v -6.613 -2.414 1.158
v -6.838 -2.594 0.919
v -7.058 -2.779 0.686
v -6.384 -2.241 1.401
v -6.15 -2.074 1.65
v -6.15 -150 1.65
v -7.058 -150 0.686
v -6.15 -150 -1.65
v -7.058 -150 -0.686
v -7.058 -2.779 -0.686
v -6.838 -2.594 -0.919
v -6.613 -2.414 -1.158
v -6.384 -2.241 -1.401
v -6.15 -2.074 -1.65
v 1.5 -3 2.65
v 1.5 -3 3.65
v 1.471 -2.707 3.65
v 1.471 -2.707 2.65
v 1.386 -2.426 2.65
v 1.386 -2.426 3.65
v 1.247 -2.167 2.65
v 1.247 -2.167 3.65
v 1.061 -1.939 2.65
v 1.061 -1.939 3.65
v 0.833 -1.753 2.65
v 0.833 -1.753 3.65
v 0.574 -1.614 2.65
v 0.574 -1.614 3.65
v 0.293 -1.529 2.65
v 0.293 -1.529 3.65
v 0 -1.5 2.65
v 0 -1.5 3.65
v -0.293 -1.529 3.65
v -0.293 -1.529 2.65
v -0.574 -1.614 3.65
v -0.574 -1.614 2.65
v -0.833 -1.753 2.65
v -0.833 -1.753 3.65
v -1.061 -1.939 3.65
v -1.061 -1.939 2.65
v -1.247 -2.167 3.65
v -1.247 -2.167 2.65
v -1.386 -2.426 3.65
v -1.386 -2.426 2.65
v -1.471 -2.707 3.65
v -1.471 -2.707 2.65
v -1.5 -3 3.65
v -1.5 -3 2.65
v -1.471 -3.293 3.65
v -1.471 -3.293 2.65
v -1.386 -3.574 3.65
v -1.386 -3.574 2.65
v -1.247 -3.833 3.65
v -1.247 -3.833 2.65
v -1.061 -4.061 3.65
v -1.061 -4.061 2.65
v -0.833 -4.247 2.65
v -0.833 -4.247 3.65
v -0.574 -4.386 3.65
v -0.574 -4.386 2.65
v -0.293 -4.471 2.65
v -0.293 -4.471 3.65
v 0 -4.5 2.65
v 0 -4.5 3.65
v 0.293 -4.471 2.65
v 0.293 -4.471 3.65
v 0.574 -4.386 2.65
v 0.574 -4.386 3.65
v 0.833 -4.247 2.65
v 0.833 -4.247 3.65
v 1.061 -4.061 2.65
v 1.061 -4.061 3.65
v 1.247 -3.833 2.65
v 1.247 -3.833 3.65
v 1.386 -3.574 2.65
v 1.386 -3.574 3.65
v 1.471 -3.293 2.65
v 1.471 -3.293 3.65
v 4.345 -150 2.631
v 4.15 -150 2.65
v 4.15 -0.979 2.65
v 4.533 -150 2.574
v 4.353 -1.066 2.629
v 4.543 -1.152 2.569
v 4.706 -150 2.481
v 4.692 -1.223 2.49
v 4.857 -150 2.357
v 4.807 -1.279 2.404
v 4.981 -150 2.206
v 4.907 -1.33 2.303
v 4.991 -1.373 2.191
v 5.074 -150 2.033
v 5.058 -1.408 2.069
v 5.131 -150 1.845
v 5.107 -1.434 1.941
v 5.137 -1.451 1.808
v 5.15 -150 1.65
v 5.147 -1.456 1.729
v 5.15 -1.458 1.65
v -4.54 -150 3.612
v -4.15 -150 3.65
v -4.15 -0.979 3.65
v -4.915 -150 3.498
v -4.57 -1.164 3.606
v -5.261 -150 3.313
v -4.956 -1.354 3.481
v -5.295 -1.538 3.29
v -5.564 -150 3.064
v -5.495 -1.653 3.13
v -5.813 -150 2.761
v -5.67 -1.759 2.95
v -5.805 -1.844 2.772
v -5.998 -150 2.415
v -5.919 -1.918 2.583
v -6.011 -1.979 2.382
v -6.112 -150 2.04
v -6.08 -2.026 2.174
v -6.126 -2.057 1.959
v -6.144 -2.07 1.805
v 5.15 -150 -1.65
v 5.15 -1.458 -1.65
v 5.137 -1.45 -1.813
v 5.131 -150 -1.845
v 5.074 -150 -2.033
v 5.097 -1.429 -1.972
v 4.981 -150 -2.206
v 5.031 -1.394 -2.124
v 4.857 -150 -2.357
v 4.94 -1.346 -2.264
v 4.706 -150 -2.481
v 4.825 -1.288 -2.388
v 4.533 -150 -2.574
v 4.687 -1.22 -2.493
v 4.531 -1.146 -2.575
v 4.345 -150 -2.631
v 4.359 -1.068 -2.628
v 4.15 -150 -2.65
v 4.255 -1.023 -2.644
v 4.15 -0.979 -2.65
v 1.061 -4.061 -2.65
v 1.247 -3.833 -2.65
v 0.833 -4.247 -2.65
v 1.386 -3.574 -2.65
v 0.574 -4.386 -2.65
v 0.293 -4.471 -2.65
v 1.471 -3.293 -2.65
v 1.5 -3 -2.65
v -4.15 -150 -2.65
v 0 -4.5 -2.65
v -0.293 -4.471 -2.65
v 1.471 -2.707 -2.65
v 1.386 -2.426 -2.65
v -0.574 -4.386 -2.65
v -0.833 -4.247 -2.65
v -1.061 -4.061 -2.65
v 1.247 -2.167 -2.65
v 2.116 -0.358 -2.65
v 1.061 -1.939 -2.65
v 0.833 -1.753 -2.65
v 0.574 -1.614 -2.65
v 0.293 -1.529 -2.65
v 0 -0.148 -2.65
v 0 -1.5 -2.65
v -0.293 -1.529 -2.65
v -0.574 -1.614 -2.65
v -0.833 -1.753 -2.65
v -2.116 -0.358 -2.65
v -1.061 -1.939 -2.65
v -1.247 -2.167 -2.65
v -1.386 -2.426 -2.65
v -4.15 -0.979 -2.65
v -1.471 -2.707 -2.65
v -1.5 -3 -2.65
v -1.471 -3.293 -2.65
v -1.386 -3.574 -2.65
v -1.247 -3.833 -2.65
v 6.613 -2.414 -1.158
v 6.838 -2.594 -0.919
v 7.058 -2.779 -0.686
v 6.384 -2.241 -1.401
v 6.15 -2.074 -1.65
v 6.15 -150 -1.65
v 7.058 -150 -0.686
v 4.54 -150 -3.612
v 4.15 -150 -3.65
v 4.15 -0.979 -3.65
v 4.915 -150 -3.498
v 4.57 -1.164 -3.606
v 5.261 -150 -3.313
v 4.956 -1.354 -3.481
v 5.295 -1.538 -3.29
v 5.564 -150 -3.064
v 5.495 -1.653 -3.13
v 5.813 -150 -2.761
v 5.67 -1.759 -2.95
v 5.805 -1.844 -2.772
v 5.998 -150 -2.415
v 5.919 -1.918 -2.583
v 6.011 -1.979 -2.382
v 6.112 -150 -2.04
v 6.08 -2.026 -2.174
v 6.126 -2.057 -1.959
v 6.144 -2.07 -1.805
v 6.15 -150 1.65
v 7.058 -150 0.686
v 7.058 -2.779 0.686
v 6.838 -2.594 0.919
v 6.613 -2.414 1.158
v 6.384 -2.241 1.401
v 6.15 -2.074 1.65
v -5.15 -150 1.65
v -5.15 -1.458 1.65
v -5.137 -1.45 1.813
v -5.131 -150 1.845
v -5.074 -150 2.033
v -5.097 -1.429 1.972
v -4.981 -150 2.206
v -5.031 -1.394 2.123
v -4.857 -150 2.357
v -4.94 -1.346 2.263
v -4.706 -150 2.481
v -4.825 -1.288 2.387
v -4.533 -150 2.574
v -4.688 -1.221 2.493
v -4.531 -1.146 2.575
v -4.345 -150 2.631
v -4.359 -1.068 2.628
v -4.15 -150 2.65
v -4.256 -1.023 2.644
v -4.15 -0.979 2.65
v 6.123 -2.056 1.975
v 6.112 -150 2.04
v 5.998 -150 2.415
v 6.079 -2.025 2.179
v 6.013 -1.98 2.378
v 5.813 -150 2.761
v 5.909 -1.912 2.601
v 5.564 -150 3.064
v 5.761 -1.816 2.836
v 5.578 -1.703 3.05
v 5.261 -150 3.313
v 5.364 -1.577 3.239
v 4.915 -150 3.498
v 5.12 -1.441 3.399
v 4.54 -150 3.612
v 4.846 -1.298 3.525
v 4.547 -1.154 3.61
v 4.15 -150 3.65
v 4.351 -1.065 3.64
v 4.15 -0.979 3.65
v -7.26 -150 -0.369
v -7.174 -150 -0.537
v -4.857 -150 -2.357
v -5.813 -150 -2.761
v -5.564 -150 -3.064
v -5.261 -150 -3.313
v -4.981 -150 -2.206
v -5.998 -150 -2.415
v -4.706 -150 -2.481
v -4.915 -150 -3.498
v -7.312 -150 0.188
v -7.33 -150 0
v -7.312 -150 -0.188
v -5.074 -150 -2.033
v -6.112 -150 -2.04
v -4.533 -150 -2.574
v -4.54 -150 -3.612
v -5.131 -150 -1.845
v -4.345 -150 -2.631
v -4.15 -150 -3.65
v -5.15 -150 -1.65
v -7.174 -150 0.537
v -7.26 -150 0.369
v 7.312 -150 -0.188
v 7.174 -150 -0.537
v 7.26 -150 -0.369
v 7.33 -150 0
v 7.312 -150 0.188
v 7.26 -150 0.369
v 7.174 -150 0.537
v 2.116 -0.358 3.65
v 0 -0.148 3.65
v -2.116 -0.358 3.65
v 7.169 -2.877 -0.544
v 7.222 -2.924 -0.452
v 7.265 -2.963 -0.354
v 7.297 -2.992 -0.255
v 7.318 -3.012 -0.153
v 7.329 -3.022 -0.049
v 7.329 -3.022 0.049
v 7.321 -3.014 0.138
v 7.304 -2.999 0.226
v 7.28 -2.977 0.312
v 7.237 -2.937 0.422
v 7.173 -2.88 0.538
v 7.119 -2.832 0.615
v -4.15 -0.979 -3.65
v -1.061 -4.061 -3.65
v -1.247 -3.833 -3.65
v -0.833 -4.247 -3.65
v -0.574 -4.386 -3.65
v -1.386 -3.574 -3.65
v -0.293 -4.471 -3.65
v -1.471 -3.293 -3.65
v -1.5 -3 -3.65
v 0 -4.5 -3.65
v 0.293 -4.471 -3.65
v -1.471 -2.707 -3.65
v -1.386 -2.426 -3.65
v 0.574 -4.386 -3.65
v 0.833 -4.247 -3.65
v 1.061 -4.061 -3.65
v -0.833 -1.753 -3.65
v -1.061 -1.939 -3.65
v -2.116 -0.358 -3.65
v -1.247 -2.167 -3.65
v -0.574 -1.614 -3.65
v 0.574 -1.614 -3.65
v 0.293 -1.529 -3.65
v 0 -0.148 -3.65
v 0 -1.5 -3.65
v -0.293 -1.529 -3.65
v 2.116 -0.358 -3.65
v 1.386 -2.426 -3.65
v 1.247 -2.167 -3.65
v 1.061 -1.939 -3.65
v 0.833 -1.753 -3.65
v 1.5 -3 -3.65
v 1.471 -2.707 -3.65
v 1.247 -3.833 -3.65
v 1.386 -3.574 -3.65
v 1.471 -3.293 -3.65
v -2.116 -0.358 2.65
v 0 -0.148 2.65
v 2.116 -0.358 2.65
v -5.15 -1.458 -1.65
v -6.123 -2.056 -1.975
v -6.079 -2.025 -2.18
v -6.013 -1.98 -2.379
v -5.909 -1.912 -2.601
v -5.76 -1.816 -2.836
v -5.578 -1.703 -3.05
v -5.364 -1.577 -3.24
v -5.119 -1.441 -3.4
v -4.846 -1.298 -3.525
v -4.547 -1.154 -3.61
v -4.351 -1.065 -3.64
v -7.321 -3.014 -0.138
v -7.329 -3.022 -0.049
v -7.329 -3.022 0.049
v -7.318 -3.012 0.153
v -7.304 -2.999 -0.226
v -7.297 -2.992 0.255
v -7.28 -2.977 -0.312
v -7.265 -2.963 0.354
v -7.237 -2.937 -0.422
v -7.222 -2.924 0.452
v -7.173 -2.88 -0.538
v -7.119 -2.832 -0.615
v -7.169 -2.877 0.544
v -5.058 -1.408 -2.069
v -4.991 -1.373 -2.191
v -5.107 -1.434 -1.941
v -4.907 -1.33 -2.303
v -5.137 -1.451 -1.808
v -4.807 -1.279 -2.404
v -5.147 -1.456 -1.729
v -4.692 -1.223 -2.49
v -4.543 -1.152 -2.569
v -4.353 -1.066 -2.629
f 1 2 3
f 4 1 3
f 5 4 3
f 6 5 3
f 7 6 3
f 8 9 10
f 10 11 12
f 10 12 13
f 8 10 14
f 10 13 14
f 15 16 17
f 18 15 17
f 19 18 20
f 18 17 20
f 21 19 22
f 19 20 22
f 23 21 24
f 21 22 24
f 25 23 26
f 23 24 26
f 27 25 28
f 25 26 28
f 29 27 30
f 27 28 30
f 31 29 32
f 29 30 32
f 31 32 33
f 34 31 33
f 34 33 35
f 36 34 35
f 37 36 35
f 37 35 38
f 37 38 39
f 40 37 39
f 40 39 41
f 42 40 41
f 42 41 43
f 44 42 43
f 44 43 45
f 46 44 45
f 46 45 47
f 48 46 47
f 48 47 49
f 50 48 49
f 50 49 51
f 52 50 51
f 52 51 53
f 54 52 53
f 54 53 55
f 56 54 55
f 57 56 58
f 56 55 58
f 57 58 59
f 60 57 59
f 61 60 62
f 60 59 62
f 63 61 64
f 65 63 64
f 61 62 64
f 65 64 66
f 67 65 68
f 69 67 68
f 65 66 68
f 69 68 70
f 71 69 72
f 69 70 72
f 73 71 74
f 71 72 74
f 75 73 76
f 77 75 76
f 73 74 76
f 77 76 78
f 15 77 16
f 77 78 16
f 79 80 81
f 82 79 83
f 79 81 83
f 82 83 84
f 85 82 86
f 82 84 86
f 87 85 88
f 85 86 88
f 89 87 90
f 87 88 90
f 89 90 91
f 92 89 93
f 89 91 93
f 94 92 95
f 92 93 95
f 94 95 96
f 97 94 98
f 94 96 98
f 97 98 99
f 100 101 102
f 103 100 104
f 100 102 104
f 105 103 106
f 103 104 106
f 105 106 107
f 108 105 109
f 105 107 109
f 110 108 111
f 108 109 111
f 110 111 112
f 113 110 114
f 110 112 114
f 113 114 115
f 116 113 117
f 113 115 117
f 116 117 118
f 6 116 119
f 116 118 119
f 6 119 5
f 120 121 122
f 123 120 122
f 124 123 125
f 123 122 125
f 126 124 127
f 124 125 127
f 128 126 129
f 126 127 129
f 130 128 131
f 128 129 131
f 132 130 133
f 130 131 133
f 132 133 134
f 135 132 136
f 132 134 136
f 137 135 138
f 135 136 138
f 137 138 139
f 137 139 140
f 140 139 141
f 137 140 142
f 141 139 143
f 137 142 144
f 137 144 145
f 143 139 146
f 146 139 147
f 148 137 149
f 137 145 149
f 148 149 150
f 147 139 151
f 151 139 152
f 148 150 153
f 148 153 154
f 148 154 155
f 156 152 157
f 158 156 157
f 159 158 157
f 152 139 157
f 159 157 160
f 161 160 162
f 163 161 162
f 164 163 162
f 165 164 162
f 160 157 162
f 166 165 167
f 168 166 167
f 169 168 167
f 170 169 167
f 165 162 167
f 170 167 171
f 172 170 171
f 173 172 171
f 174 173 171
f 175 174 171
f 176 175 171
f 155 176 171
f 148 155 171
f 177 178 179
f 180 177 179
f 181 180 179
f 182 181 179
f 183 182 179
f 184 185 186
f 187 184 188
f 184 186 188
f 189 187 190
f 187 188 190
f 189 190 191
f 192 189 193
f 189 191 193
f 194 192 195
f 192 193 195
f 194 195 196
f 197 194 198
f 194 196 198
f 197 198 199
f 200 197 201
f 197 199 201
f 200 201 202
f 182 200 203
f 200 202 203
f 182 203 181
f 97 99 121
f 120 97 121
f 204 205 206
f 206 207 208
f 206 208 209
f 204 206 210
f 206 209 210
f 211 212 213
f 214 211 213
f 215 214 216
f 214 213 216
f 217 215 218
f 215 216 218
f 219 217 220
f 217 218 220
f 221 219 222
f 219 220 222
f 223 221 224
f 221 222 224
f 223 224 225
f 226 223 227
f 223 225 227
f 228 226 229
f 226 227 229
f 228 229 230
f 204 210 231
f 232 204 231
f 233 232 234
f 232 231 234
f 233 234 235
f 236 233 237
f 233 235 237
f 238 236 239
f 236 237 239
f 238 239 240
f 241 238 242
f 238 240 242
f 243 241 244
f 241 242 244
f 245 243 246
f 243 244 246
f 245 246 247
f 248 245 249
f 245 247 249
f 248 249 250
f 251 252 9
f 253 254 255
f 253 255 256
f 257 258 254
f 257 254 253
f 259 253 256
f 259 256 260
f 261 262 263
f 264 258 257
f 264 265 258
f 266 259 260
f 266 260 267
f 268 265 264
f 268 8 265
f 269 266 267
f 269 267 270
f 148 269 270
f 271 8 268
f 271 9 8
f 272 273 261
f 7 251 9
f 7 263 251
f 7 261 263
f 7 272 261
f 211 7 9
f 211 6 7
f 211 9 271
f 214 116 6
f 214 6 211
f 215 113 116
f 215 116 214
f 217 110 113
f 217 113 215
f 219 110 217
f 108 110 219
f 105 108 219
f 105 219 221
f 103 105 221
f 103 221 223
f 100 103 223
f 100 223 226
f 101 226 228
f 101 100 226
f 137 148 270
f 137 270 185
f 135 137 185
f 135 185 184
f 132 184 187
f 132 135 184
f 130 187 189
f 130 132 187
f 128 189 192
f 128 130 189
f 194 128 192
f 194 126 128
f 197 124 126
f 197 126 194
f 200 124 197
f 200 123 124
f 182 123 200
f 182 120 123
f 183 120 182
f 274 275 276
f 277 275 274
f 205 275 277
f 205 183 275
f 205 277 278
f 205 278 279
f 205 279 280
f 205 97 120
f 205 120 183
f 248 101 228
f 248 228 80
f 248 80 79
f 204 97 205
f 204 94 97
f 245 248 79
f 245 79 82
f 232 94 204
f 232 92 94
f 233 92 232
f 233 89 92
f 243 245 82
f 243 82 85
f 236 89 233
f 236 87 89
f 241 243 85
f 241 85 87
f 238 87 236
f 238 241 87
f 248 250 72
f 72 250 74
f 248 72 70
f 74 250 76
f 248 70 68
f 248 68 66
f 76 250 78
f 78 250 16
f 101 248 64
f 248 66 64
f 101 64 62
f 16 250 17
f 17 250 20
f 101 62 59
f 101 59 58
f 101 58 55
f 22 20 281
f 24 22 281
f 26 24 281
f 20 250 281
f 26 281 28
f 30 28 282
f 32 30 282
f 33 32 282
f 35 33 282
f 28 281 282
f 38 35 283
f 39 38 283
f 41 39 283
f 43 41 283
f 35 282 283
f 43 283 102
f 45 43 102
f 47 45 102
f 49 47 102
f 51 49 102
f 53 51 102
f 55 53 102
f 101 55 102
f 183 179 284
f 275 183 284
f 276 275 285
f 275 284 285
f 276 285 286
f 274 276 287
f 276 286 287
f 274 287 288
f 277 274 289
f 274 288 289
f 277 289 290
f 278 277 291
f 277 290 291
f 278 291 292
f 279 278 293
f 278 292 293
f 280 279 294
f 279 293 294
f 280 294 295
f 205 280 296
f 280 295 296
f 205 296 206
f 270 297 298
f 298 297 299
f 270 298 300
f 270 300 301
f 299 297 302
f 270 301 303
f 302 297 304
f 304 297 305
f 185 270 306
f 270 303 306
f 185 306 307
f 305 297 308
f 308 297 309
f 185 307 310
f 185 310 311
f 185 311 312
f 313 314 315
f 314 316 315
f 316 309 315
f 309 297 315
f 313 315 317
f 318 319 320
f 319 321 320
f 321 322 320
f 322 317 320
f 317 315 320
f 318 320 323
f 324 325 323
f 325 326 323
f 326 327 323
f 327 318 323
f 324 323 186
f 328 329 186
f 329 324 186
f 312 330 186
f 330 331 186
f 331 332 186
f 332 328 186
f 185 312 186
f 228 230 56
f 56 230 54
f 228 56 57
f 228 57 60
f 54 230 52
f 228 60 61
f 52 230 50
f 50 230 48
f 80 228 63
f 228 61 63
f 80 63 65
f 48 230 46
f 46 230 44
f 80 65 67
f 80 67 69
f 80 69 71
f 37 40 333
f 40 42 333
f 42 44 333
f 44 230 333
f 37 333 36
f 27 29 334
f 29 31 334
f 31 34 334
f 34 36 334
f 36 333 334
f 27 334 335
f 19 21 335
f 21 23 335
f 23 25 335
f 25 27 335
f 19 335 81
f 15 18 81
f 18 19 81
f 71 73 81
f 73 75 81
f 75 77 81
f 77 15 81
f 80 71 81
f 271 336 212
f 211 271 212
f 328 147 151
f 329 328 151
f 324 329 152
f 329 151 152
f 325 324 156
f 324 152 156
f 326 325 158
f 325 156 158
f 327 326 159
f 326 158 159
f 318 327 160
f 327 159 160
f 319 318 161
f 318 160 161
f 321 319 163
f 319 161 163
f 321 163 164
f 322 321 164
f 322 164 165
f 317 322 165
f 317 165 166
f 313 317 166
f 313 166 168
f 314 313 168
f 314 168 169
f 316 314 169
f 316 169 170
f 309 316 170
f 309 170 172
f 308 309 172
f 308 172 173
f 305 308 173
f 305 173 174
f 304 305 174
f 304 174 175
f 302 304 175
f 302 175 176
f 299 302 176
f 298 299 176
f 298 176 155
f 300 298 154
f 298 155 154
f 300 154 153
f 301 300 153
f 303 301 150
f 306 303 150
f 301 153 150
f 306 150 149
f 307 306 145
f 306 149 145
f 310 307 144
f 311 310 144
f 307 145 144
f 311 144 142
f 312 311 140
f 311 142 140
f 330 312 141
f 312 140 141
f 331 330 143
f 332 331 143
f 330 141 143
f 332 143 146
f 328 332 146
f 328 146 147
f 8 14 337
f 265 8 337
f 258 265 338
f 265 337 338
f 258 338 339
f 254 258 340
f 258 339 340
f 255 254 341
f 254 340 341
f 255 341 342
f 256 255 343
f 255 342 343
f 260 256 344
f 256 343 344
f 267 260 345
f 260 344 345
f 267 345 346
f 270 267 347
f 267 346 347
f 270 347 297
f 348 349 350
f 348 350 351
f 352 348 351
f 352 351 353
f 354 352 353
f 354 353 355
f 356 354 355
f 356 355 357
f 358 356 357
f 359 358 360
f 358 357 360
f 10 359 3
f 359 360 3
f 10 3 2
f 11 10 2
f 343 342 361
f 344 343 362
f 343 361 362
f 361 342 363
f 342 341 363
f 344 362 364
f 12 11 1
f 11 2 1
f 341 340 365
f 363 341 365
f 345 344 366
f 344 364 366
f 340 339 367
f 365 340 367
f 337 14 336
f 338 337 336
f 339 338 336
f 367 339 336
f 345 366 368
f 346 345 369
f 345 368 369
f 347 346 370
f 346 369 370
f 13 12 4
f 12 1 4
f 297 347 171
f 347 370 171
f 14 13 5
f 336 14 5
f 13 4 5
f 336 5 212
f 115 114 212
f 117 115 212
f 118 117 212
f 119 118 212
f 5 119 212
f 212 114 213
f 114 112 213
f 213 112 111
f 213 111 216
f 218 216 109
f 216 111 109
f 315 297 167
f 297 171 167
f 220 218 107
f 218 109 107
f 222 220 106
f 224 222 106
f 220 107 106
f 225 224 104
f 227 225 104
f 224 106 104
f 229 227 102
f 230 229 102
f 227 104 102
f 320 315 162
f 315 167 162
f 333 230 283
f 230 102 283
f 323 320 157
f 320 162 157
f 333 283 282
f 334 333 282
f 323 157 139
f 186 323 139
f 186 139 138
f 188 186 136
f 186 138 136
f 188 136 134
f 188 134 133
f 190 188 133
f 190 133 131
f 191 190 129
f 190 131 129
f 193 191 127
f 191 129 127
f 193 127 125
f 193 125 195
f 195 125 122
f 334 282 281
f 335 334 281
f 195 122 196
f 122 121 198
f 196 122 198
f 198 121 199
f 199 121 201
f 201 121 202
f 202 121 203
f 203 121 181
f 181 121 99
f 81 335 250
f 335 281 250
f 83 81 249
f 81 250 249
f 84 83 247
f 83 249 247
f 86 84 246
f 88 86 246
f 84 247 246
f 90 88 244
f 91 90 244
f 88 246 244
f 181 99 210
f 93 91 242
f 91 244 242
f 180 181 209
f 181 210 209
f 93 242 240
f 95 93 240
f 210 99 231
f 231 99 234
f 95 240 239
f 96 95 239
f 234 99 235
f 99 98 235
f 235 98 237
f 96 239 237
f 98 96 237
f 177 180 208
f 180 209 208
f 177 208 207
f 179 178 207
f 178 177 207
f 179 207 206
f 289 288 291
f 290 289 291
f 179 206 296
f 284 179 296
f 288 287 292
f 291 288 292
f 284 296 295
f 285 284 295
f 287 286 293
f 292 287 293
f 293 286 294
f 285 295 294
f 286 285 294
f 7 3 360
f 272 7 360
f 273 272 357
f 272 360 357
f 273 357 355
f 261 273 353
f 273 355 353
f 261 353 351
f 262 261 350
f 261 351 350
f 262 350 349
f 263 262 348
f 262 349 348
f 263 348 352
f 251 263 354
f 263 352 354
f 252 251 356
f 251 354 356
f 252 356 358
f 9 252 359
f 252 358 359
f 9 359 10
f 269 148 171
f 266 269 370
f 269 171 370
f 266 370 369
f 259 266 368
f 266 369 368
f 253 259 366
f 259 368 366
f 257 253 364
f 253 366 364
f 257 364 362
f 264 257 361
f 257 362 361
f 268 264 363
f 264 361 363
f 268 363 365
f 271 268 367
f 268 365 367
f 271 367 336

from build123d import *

# Parameters (mm, degrees)
F1_DEPTH = 150
F2_R     = 1.5
F3_DEPTH = 7.301
F6_DEPTH = 25


# Not quite as in the source:
# - a feature names something its author has since deleted; it is built from what else it names


with BuildPart() as f1:
    # F0 (on Front) → F1 (new body)
    with BuildSketch(Plane.XZ):
        with BuildLine():
            Line((7.0581561667, 0.685534298), (6.15, 1.65))
            ThreePointArc((6.15, 1.65), (5.5642135624, 3.0642135624), (4.15, 3.65))
            Line((4.15, 3.65), (-4.15, 3.65))
            ThreePointArc((-4.15, 3.65), (-5.5642135624, 3.0642135624), (-6.15, 1.65))
            Line((-6.15, 1.65), (-7.0581561667, 0.685534298))
            ThreePointArc((-7.0581561667, 0.685534298), (-7.3301158338, 0), (-7.0581561667, -0.685534298))
            Line((-7.0581561667, -0.685534298), (-6.15, -1.65))
            ThreePointArc((-6.15, -1.65), (-5.5642135624, -3.0642135624), (-4.15, -3.65))
            Line((-4.15, -3.65), (4.15, -3.65))
            ThreePointArc((4.15, -3.65), (5.5642135624, -3.0642135624), (6.15, -1.65))
            Line((6.15, -1.65), (7.0581561667, -0.685534298))
            ThreePointArc((7.0581561667, -0.685534298), (7.3301158338, 0), (7.0581561667, 0.685534298))
        make_face()
        with BuildLine():
            ThreePointArc((5.15, -1.65), (4.8571067812, -2.3571067812), (4.15, -2.65))
            Line((4.15, -2.65), (-4.15, -2.65))
            ThreePointArc((-4.15, -2.65), (-4.8571067812, -2.3571067812), (-5.15, -1.65))
            Line((-5.15, -1.65), (-5.15, 1.65))
            ThreePointArc((-5.15, 1.65), (-4.8571067812, 2.3571067812), (-4.15, 2.65))
            Line((-4.15, 2.65), (4.15, 2.65))
            ThreePointArc((4.15, 2.65), (4.8571067812, 2.3571067812), (5.15, 1.65))
            Line((5.15, 1.65), (5.15, -1.65))
        make_face(mode=Mode.SUBTRACT)
    extrude(amount=F1_DEPTH)

    # F2 (on face) → F3 (cut, through all)
    with BuildSketch(Plane.XY.offset(3.65)):
        with Locations((0, -3)):
            Circle(F2_R)
    extrude(amount=-F3_DEPTH, mode=Mode.SUBTRACT)

    # F5 (on offset) → F6 (cut)
    with BuildSketch(Plane.XY.offset(4.6)):
        with BuildLine():
            Line((8, -3.7011680724), (8, 3.7011680724))
            Line((8, 3.7011680724), (-8, 3.7011680724))
            Line((-8, 3.7011680724), (-8, -3.7011680724))
            ThreePointArc((-8, -3.7011680724), (0, -0.1482238292), (8, -3.7011680724))
        make_face()
    extrude(amount=-F6_DEPTH, mode=Mode.SUBTRACT)


solid = f1.part
